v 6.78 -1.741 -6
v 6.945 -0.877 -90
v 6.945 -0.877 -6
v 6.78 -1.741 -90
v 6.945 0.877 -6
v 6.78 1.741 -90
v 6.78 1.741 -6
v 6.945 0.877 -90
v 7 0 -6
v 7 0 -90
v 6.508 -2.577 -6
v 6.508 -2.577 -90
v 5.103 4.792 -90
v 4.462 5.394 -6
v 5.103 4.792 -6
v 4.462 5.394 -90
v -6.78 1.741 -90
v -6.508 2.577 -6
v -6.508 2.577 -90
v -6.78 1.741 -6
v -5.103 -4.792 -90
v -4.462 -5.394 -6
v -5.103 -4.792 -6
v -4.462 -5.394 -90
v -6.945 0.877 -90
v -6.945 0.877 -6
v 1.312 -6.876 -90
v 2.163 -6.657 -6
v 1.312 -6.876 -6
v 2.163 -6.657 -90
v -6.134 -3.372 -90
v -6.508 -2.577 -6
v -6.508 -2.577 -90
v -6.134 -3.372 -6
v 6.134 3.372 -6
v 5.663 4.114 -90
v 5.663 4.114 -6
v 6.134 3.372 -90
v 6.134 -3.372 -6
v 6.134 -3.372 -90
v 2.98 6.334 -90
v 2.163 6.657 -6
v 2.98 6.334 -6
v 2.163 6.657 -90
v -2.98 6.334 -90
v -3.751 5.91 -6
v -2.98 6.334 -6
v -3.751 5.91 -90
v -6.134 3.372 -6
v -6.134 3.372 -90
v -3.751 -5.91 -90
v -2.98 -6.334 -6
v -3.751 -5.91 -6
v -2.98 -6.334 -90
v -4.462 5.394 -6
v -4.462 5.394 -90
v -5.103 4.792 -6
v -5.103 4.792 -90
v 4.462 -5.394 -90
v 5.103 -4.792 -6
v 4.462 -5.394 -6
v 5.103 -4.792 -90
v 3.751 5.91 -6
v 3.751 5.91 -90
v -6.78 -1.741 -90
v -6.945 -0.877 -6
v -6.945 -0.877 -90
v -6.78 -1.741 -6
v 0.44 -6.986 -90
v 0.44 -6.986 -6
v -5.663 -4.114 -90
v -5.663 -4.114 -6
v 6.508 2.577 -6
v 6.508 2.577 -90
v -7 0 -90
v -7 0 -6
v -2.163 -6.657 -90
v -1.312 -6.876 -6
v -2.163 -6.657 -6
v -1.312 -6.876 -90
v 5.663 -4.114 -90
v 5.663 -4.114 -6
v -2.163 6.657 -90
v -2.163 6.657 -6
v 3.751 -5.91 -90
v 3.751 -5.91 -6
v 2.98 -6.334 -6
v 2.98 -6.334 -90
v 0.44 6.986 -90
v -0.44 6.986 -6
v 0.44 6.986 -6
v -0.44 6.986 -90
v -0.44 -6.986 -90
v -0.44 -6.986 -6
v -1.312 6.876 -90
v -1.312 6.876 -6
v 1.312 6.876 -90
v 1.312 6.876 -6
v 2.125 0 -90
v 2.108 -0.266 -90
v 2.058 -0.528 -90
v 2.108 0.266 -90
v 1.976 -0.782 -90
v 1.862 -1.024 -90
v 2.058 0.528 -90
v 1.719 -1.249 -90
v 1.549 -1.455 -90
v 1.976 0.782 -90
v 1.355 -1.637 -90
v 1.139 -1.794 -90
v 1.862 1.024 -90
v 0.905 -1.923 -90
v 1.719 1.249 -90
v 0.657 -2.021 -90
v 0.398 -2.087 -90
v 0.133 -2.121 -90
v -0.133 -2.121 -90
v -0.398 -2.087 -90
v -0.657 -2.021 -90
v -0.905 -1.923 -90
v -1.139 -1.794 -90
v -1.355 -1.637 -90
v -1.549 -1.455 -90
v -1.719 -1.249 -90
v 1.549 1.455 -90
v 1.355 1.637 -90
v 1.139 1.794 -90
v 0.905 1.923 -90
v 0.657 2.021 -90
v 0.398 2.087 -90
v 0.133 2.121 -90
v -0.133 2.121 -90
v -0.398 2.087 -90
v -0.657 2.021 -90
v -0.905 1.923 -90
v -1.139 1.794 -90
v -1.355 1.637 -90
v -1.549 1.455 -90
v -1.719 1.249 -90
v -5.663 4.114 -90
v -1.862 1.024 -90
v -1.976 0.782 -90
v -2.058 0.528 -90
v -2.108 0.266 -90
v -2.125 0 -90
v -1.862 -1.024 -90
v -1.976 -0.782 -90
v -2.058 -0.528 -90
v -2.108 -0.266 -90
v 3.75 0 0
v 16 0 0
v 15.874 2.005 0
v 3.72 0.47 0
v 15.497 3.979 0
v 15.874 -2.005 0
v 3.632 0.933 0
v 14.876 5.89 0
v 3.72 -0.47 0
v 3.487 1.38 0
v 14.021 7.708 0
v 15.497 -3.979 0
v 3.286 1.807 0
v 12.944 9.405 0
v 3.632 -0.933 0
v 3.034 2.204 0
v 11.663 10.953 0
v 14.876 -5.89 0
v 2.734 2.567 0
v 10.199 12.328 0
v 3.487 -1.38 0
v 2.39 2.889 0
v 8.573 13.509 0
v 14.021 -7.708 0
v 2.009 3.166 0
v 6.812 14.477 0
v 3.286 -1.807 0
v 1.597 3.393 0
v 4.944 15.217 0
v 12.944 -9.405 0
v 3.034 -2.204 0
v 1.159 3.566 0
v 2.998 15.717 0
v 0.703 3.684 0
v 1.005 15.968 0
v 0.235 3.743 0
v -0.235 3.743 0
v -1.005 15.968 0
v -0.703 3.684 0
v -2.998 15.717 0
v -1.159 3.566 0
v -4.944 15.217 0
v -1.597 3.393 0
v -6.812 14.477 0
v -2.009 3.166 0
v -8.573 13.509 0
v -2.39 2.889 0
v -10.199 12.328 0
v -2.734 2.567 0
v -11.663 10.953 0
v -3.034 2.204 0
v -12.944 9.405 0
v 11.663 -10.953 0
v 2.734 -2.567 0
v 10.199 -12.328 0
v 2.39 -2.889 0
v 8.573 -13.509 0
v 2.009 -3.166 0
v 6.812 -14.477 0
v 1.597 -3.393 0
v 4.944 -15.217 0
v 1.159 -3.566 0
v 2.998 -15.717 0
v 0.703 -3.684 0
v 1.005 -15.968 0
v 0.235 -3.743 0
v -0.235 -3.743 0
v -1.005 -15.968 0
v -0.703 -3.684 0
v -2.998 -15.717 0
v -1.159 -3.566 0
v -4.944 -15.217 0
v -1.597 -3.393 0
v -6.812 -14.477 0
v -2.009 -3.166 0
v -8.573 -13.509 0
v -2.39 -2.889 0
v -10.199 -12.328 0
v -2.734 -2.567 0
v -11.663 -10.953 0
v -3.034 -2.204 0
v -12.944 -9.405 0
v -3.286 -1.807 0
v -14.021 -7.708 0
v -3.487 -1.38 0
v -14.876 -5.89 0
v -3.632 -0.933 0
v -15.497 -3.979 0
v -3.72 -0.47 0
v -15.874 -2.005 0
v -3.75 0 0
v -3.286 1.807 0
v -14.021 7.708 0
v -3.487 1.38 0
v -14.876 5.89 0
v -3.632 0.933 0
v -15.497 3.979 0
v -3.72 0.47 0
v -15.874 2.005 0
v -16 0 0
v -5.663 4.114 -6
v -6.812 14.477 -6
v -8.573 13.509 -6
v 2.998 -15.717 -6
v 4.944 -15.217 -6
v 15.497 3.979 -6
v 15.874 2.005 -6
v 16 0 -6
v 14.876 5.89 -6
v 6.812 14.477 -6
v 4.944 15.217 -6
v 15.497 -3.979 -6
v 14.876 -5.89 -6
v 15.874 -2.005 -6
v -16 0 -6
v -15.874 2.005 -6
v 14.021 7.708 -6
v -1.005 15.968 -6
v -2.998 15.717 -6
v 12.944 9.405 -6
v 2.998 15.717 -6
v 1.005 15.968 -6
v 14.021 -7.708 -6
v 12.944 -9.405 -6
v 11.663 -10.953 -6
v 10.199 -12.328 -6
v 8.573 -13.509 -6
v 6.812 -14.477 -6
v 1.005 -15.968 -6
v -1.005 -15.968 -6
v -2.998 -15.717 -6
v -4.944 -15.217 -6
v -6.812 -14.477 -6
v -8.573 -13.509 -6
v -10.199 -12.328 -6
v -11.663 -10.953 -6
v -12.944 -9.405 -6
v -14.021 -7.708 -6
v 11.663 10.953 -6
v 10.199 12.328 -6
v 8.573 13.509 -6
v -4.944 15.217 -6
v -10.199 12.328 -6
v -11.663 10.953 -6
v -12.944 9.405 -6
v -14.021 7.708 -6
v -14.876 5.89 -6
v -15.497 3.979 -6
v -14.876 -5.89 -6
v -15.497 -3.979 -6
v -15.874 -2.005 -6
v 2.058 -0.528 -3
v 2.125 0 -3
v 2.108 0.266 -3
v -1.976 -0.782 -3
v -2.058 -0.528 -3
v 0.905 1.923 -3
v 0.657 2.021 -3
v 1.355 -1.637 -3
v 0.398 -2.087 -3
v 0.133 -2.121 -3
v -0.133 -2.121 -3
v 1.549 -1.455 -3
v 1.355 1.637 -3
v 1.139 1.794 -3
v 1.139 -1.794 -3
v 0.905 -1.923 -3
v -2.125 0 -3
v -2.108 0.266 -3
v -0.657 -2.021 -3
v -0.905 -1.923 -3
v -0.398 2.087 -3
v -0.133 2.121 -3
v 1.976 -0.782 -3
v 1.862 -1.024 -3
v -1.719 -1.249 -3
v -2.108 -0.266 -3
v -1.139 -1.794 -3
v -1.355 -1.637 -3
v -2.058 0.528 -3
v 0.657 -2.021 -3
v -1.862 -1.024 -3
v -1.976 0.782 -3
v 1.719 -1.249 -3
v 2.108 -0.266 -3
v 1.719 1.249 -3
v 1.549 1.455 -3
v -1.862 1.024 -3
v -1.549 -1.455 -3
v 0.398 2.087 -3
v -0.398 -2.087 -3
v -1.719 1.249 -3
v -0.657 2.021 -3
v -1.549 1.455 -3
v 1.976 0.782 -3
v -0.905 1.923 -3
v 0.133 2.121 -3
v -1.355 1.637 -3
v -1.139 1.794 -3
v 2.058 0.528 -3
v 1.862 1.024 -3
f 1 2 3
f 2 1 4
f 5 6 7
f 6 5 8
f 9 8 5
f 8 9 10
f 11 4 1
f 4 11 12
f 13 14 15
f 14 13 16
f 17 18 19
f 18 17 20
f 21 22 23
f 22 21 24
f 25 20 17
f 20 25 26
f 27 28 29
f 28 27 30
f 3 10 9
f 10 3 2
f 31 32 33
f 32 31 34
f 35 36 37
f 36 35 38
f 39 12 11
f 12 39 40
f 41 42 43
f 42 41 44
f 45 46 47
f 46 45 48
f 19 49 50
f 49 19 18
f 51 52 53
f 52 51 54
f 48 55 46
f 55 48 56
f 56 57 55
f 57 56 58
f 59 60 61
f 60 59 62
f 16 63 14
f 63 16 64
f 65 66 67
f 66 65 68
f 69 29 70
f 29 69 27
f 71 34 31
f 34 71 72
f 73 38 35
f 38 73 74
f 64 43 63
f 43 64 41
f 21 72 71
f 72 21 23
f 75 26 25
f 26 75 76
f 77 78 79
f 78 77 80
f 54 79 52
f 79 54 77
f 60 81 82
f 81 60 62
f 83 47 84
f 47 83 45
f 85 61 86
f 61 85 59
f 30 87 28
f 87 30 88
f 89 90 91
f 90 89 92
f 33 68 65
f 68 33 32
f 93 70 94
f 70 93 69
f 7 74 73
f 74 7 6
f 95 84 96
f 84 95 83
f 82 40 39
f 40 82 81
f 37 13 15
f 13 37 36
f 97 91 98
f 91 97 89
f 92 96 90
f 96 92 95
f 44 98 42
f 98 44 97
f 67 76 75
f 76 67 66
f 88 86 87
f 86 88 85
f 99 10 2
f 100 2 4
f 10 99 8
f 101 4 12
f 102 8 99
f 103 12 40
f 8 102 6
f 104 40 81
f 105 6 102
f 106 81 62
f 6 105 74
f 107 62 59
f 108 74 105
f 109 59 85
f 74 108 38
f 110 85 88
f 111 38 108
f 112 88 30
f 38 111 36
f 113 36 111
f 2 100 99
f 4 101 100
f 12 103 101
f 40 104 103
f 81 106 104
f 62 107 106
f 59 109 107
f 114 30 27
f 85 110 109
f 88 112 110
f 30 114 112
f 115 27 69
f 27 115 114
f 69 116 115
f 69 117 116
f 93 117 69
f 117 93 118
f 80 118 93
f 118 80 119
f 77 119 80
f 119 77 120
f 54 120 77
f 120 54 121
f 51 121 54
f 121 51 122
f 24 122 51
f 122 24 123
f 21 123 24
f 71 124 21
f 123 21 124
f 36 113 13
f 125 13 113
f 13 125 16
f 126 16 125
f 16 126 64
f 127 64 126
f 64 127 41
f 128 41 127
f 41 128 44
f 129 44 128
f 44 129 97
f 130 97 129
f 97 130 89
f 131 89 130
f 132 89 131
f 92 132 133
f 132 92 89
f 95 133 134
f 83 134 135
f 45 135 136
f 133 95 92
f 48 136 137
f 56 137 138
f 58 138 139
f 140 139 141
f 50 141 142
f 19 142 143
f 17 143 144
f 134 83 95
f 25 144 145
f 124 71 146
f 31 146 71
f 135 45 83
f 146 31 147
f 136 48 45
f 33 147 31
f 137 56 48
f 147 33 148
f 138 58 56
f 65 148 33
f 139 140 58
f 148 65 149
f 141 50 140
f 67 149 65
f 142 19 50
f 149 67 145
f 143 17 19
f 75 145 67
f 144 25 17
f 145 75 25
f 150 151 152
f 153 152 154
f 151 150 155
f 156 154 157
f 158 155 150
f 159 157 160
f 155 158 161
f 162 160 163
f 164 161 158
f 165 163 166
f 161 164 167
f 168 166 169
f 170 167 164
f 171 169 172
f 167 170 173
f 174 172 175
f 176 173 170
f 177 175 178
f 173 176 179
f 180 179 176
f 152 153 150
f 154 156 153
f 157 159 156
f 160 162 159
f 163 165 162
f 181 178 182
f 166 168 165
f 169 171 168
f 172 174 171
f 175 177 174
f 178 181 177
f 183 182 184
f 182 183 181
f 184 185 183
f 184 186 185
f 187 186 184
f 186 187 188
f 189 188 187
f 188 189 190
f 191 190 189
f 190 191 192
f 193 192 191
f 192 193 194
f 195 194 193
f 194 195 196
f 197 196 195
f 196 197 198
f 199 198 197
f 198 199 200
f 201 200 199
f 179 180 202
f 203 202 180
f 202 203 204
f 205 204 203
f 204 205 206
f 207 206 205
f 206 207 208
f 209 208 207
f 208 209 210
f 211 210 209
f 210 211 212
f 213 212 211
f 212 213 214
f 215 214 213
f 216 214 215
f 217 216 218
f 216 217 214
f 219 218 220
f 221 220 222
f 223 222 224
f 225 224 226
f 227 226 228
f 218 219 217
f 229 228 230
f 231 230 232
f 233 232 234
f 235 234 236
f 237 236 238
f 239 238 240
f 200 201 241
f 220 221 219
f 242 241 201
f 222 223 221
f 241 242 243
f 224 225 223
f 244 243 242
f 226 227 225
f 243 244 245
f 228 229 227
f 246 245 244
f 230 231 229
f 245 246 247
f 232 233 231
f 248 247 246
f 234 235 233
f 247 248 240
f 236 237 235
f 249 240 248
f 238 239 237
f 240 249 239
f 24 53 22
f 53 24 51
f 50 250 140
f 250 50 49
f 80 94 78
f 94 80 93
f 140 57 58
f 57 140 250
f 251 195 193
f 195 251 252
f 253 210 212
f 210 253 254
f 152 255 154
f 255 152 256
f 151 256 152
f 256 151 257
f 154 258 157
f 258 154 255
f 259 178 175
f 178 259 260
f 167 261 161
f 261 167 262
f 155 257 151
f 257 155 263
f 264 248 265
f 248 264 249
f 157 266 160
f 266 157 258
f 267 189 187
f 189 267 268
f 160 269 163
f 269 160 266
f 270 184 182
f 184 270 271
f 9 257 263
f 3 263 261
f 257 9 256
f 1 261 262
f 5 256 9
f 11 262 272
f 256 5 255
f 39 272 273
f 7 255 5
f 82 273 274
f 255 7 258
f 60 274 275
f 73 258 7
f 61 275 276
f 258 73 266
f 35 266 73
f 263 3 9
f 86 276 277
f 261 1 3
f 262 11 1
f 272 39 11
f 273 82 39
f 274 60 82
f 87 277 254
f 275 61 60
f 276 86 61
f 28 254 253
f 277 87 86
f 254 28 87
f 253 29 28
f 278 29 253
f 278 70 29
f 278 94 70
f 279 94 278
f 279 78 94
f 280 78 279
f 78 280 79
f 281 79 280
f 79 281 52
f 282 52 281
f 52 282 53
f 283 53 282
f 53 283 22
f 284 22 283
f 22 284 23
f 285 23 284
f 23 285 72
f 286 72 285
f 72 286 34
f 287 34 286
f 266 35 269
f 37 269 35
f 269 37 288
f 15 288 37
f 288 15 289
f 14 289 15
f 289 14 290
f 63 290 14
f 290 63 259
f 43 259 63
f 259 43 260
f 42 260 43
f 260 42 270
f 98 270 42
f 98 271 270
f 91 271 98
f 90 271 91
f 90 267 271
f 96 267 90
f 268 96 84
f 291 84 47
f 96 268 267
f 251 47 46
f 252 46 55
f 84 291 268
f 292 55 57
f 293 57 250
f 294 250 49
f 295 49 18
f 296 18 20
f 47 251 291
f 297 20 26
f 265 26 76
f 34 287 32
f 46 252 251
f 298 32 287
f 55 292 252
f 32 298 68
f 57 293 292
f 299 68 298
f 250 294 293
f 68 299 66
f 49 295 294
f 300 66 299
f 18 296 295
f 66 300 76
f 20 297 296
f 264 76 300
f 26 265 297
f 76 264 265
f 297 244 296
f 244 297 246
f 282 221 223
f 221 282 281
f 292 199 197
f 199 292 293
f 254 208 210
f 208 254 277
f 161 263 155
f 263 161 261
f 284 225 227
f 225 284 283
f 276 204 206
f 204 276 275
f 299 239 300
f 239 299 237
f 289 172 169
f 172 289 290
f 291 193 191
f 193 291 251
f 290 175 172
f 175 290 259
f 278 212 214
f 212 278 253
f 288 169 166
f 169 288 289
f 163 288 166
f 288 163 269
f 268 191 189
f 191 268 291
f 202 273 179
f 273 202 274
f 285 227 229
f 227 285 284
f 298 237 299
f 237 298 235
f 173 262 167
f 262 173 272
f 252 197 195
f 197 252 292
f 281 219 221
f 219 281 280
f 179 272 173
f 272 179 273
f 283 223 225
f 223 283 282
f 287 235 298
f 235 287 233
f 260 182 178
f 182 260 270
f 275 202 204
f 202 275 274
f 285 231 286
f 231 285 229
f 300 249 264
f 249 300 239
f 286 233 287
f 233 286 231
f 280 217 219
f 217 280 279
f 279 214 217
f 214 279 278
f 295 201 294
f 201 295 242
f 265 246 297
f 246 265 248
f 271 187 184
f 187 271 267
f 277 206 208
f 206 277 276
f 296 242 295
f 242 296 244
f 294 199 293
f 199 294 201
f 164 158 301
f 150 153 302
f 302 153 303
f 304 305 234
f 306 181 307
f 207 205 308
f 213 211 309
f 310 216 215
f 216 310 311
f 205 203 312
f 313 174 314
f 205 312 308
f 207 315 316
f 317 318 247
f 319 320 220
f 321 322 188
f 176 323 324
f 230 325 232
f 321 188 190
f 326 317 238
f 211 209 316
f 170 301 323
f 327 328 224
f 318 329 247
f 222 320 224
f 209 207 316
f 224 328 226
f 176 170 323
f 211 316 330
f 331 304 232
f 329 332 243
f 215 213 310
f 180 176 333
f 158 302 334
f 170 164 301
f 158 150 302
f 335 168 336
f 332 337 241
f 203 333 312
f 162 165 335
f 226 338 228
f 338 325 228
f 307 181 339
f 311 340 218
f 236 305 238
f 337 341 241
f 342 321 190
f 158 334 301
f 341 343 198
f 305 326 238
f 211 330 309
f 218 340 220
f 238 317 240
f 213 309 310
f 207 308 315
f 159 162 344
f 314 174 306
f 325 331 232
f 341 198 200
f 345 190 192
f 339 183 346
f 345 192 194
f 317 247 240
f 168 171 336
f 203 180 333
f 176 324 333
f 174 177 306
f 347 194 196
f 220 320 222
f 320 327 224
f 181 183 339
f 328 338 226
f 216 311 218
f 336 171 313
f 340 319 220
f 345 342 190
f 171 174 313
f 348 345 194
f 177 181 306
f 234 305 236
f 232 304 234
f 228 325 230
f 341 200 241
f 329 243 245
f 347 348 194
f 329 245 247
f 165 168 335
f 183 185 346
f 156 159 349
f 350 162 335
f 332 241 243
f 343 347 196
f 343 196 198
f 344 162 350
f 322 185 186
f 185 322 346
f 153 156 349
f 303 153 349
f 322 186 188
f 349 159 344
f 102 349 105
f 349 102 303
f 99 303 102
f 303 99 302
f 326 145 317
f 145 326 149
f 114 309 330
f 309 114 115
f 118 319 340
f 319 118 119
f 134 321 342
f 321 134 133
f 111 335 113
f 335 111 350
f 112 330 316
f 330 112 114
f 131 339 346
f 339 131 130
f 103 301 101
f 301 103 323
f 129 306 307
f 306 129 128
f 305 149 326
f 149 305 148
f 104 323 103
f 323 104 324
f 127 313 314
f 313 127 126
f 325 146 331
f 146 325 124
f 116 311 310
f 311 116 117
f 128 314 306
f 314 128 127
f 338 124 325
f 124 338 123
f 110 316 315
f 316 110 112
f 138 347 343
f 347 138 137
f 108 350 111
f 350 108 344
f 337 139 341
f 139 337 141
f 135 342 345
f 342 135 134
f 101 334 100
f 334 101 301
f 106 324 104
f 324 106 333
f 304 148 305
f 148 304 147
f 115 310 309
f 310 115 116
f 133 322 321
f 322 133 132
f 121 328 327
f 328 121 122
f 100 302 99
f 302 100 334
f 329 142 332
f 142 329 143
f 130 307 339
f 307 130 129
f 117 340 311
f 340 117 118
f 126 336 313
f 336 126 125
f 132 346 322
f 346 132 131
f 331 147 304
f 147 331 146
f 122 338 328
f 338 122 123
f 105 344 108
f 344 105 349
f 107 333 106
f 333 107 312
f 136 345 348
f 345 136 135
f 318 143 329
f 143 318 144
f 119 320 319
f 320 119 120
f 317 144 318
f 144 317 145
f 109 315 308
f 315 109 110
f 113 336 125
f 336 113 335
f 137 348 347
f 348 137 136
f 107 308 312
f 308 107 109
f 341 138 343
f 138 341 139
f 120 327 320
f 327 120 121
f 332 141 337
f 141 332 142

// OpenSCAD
$fn = 50;


difference() {
	union() {
		translate(v = [0, 0, -90.0000000000]) {
			cylinder(h = 90, r = 7.0000000000);
		}
		translate(v = [0, 0, -6.0000000000]) {
			cylinder(h = 6, r = 16.0000000000);
		}
	}
	union() {
		translate(v = [0, 0, 0]) {
			rotate(a = [0, 0, 0]) {
				difference() {
					union() {
						#translate(v = [0, 0, -90.0000000000]) {
							cylinder(h = 90, r = 2.0000000000);
						}
						#translate(v = [0, 0, -3]) {
							cylinder(h = 3, r = 7.0000000000, r1 = 2.1250000000, r2 = 3.7500000000);
						}
						#translate(v = [0, 0, -90.0000000000]) {
							cylinder(h = 90, r = 2.1250000000);
						}
						#translate(v = [0, 0, -90.0000000000]) {
							cylinder(h = 90, r = 2.0000000000);
						}
					}
					union();
				}
			}
		}
	}
}
